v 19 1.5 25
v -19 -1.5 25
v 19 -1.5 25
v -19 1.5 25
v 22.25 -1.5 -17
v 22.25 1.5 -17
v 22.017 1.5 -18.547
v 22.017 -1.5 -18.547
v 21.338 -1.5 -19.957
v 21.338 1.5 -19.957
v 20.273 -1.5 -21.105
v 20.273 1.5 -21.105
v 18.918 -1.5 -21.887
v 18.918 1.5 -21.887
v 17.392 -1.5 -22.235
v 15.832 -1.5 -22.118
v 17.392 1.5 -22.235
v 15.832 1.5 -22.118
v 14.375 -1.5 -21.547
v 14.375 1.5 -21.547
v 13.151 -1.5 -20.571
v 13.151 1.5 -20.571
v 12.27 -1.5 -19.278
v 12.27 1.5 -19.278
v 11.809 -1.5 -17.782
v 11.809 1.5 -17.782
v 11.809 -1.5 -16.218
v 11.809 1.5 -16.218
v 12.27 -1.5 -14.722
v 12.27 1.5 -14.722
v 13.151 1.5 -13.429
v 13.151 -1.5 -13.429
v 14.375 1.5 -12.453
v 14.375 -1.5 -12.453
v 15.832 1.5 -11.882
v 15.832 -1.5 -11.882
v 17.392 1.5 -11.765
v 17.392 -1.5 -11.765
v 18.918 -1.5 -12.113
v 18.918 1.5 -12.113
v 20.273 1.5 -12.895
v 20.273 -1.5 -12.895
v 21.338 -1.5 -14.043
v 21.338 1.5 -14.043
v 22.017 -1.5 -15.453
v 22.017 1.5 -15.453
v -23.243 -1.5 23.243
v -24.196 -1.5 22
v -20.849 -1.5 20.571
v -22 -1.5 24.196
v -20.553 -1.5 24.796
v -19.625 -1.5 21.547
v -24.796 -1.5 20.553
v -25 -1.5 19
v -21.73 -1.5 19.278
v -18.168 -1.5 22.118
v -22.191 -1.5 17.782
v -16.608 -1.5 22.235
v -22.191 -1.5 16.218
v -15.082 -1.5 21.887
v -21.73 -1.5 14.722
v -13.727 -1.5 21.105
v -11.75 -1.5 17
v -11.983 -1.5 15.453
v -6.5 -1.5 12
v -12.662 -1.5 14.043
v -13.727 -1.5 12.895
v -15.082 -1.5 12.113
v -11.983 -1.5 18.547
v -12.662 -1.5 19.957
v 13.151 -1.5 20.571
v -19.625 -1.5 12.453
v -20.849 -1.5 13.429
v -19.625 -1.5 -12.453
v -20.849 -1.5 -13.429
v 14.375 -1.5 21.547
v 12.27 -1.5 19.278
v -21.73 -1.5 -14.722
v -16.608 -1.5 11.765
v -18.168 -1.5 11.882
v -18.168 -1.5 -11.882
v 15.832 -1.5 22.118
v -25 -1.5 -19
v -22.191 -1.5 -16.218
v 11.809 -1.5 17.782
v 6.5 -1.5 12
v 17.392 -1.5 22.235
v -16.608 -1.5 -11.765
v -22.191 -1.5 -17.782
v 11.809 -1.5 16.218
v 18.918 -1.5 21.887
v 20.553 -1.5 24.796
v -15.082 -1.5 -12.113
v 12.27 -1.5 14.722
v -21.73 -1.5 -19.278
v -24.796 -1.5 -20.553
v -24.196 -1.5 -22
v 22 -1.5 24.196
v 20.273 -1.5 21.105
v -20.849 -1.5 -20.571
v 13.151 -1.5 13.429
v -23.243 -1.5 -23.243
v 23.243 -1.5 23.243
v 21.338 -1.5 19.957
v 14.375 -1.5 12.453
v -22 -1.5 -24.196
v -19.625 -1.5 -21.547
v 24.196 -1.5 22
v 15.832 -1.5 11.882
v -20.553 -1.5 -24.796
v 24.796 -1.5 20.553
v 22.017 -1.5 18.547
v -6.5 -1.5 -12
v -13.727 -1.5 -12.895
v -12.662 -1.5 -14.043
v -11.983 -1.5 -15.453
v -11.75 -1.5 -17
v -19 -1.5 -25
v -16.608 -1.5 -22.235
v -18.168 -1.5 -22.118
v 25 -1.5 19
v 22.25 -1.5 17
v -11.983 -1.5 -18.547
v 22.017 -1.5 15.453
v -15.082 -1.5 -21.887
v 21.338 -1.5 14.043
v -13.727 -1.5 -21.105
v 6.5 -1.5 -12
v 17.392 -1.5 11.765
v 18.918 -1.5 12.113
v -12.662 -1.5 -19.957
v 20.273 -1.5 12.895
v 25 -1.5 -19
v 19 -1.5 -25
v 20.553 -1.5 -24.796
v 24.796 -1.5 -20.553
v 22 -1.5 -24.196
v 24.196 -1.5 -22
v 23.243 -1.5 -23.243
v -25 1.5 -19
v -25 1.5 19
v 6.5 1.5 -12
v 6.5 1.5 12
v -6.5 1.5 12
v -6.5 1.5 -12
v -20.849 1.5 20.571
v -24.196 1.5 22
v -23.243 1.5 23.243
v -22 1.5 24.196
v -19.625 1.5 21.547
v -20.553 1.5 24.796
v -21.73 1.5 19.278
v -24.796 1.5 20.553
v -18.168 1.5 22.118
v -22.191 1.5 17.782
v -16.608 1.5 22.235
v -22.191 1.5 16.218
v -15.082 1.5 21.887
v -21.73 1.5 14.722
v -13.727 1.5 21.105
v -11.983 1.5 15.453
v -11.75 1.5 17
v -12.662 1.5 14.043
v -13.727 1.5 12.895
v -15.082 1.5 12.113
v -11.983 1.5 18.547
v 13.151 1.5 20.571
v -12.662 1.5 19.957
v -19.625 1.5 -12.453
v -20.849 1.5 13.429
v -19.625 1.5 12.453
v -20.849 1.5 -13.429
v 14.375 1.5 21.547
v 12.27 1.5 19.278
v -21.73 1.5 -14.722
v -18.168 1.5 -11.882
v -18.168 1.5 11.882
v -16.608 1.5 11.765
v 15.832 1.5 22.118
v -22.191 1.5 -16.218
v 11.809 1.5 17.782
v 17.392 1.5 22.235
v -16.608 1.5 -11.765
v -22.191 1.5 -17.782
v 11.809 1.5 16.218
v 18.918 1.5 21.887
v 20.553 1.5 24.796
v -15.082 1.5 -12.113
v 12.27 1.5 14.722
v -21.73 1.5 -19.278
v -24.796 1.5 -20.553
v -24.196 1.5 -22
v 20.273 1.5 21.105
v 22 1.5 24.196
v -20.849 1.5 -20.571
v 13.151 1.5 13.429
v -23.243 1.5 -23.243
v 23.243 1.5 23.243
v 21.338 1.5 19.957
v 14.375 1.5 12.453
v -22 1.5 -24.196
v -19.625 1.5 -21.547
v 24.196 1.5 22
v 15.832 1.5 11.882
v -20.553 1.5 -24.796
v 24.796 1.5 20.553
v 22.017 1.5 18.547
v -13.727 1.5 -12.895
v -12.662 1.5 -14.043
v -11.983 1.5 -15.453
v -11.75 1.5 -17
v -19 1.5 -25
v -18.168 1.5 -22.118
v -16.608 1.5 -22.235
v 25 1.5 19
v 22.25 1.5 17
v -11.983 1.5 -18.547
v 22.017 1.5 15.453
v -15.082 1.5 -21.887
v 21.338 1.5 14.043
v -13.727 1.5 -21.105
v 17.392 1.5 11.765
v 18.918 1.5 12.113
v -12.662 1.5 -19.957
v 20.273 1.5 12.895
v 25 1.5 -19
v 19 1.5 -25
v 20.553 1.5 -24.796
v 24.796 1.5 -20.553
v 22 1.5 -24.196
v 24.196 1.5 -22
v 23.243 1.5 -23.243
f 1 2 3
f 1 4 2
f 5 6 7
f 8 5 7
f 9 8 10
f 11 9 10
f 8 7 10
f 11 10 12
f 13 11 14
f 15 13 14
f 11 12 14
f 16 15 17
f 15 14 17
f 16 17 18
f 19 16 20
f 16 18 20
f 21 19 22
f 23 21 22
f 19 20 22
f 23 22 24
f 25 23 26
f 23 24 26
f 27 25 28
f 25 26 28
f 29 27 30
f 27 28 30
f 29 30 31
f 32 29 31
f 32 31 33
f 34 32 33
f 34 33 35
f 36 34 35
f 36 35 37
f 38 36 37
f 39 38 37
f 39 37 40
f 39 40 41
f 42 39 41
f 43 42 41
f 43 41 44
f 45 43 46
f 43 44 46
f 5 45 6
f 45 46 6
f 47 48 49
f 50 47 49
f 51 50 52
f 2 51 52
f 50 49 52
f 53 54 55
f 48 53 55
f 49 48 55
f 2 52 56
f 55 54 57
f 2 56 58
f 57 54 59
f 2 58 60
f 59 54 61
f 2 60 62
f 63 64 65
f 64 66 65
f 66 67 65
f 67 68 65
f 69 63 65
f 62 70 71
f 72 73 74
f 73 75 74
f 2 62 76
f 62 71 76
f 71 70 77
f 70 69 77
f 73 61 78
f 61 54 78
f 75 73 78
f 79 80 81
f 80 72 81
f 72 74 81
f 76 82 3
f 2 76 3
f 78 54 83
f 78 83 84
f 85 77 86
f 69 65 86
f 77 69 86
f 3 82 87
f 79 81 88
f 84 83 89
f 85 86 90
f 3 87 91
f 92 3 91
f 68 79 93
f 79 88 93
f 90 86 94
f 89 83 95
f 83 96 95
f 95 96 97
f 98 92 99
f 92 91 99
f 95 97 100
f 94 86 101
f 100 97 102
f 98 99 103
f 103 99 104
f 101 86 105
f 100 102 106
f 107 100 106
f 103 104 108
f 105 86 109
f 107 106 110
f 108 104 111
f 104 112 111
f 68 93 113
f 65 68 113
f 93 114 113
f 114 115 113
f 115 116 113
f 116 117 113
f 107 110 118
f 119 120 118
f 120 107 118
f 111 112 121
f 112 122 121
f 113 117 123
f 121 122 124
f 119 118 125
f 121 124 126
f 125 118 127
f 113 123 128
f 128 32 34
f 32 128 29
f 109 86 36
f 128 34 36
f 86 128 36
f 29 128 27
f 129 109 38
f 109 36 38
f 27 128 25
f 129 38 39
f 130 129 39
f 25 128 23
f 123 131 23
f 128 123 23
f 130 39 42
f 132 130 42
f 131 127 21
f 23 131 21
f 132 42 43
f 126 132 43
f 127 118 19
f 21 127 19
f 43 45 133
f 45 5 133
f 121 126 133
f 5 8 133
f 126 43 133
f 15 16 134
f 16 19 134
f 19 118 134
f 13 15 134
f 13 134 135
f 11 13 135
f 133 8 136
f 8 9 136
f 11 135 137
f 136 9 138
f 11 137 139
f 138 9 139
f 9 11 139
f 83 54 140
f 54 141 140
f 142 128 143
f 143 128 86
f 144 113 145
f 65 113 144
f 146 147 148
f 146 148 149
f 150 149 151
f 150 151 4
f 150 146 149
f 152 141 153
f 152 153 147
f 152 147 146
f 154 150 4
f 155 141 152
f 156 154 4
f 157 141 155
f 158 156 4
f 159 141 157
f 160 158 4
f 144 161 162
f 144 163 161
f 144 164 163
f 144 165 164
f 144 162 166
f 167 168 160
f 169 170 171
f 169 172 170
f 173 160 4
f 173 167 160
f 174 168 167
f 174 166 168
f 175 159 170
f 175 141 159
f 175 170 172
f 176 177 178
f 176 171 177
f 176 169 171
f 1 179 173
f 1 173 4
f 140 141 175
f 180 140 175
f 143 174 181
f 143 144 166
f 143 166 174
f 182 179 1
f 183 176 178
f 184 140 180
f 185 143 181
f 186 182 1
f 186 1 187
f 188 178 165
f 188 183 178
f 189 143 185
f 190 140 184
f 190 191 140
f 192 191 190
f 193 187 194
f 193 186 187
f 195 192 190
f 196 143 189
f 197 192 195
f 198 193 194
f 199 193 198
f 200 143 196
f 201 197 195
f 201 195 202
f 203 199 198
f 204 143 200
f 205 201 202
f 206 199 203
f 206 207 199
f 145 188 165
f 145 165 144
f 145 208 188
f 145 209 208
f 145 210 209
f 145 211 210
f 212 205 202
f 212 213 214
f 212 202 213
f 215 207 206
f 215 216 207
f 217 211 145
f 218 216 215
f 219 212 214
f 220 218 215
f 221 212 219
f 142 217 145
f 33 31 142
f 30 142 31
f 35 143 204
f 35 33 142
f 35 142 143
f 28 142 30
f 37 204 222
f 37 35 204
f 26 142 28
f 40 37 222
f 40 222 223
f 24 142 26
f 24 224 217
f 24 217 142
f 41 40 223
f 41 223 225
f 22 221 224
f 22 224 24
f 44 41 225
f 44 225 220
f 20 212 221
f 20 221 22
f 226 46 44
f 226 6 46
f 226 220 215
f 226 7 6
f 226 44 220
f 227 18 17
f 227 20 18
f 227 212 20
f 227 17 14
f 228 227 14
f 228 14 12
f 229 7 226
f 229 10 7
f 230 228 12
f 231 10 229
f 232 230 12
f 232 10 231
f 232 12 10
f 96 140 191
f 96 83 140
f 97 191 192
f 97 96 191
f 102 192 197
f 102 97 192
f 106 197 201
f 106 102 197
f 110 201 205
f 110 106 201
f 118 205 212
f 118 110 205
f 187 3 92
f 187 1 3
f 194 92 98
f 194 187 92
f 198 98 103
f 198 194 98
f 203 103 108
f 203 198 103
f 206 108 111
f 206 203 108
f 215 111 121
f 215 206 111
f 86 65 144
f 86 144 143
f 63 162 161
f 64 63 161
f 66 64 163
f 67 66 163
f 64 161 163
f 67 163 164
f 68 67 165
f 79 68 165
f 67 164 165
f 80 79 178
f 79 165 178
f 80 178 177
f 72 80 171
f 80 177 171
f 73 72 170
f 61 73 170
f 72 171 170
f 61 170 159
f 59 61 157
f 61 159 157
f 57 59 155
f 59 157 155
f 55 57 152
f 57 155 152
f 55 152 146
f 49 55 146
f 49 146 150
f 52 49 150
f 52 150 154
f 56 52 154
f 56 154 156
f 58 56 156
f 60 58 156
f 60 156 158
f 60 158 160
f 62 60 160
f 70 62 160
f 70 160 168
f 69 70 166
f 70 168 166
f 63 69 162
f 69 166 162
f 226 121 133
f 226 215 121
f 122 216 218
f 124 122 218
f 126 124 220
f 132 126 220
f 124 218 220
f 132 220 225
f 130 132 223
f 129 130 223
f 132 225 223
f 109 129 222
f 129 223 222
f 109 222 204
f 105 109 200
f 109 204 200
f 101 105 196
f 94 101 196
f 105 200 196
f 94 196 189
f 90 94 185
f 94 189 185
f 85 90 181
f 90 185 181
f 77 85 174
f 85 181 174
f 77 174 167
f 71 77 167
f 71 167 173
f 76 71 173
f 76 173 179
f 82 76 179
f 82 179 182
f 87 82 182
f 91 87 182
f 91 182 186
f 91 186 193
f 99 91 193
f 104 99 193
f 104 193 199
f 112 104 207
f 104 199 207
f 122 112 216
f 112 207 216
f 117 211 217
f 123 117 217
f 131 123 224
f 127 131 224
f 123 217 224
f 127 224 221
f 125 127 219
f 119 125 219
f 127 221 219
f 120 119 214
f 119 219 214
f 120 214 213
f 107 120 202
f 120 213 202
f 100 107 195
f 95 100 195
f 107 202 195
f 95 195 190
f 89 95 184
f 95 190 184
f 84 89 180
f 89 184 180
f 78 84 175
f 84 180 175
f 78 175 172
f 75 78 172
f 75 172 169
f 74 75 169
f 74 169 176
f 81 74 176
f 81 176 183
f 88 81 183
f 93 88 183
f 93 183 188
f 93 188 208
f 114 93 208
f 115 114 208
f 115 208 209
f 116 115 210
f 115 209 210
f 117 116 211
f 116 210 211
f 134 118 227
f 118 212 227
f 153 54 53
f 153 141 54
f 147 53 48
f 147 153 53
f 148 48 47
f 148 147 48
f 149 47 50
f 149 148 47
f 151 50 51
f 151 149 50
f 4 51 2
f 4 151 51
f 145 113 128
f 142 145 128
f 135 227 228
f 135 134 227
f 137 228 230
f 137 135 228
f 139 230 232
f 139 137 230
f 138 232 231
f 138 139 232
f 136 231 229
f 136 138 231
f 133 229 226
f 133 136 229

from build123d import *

# Parameters (mm, degrees)
SKETCH1_W           = 50
SKETCH1_H           = 50
BOSS_EXTRUDE1_DEPTH = 1.5
SKETCH2_R           = 5.25
CUT_EXTRUDE1_DEPTH  = 3
FILLET1_R           = 6
SKETCH3_W           = 13
SKETCH3_H           = 24
CUT_EXTRUDE2_DEPTH  = 3


with BuildPart() as part:
    # Sketch1 → Boss-Extrude1 (new body, symmetric)
    with BuildSketch(Plane(origin=(0, 0, 0), x_dir=(1, 0, 0), z_dir=(0, 1, 0))):
        Rectangle(SKETCH1_W, SKETCH1_H)
    extrude(amount=BOSS_EXTRUDE1_DEPTH, both=True)

    # Sketch2 → Cut-Extrude1 (cut)
    with BuildSketch(Plane(origin=(0, 1.5, 0), x_dir=(1, 0, 0), z_dir=(0, 1, 0))):
        with Locations((17, -17)):
            Circle(SKETCH2_R)
        with Locations((-17, -17)):
            Circle(SKETCH2_R)
        with Locations((-17, 17)):
            Circle(SKETCH2_R)
        with Locations((17, 17)):
            Circle(SKETCH2_R)
    extrude(amount=-CUT_EXTRUDE1_DEPTH, mode=Mode.SUBTRACT)

    # Fillet1
    fillet1_edges = [part.edges().sort_by_distance(p)[0] for p in [
        (25, 0, 25),
        (-25, 0, 25),
        (-25, 0, -25),
        (25, 0, -25),
    ]]
    fillet(fillet1_edges, radius=FILLET1_R)

    # Sketch3 → Cut-Extrude2 (cut)
    with BuildSketch(Plane.XZ.offset(1.5)):
        Rectangle(SKETCH3_W, SKETCH3_H)
    extrude(amount=-CUT_EXTRUDE2_DEPTH, mode=Mode.SUBTRACT)


solid = part.part
